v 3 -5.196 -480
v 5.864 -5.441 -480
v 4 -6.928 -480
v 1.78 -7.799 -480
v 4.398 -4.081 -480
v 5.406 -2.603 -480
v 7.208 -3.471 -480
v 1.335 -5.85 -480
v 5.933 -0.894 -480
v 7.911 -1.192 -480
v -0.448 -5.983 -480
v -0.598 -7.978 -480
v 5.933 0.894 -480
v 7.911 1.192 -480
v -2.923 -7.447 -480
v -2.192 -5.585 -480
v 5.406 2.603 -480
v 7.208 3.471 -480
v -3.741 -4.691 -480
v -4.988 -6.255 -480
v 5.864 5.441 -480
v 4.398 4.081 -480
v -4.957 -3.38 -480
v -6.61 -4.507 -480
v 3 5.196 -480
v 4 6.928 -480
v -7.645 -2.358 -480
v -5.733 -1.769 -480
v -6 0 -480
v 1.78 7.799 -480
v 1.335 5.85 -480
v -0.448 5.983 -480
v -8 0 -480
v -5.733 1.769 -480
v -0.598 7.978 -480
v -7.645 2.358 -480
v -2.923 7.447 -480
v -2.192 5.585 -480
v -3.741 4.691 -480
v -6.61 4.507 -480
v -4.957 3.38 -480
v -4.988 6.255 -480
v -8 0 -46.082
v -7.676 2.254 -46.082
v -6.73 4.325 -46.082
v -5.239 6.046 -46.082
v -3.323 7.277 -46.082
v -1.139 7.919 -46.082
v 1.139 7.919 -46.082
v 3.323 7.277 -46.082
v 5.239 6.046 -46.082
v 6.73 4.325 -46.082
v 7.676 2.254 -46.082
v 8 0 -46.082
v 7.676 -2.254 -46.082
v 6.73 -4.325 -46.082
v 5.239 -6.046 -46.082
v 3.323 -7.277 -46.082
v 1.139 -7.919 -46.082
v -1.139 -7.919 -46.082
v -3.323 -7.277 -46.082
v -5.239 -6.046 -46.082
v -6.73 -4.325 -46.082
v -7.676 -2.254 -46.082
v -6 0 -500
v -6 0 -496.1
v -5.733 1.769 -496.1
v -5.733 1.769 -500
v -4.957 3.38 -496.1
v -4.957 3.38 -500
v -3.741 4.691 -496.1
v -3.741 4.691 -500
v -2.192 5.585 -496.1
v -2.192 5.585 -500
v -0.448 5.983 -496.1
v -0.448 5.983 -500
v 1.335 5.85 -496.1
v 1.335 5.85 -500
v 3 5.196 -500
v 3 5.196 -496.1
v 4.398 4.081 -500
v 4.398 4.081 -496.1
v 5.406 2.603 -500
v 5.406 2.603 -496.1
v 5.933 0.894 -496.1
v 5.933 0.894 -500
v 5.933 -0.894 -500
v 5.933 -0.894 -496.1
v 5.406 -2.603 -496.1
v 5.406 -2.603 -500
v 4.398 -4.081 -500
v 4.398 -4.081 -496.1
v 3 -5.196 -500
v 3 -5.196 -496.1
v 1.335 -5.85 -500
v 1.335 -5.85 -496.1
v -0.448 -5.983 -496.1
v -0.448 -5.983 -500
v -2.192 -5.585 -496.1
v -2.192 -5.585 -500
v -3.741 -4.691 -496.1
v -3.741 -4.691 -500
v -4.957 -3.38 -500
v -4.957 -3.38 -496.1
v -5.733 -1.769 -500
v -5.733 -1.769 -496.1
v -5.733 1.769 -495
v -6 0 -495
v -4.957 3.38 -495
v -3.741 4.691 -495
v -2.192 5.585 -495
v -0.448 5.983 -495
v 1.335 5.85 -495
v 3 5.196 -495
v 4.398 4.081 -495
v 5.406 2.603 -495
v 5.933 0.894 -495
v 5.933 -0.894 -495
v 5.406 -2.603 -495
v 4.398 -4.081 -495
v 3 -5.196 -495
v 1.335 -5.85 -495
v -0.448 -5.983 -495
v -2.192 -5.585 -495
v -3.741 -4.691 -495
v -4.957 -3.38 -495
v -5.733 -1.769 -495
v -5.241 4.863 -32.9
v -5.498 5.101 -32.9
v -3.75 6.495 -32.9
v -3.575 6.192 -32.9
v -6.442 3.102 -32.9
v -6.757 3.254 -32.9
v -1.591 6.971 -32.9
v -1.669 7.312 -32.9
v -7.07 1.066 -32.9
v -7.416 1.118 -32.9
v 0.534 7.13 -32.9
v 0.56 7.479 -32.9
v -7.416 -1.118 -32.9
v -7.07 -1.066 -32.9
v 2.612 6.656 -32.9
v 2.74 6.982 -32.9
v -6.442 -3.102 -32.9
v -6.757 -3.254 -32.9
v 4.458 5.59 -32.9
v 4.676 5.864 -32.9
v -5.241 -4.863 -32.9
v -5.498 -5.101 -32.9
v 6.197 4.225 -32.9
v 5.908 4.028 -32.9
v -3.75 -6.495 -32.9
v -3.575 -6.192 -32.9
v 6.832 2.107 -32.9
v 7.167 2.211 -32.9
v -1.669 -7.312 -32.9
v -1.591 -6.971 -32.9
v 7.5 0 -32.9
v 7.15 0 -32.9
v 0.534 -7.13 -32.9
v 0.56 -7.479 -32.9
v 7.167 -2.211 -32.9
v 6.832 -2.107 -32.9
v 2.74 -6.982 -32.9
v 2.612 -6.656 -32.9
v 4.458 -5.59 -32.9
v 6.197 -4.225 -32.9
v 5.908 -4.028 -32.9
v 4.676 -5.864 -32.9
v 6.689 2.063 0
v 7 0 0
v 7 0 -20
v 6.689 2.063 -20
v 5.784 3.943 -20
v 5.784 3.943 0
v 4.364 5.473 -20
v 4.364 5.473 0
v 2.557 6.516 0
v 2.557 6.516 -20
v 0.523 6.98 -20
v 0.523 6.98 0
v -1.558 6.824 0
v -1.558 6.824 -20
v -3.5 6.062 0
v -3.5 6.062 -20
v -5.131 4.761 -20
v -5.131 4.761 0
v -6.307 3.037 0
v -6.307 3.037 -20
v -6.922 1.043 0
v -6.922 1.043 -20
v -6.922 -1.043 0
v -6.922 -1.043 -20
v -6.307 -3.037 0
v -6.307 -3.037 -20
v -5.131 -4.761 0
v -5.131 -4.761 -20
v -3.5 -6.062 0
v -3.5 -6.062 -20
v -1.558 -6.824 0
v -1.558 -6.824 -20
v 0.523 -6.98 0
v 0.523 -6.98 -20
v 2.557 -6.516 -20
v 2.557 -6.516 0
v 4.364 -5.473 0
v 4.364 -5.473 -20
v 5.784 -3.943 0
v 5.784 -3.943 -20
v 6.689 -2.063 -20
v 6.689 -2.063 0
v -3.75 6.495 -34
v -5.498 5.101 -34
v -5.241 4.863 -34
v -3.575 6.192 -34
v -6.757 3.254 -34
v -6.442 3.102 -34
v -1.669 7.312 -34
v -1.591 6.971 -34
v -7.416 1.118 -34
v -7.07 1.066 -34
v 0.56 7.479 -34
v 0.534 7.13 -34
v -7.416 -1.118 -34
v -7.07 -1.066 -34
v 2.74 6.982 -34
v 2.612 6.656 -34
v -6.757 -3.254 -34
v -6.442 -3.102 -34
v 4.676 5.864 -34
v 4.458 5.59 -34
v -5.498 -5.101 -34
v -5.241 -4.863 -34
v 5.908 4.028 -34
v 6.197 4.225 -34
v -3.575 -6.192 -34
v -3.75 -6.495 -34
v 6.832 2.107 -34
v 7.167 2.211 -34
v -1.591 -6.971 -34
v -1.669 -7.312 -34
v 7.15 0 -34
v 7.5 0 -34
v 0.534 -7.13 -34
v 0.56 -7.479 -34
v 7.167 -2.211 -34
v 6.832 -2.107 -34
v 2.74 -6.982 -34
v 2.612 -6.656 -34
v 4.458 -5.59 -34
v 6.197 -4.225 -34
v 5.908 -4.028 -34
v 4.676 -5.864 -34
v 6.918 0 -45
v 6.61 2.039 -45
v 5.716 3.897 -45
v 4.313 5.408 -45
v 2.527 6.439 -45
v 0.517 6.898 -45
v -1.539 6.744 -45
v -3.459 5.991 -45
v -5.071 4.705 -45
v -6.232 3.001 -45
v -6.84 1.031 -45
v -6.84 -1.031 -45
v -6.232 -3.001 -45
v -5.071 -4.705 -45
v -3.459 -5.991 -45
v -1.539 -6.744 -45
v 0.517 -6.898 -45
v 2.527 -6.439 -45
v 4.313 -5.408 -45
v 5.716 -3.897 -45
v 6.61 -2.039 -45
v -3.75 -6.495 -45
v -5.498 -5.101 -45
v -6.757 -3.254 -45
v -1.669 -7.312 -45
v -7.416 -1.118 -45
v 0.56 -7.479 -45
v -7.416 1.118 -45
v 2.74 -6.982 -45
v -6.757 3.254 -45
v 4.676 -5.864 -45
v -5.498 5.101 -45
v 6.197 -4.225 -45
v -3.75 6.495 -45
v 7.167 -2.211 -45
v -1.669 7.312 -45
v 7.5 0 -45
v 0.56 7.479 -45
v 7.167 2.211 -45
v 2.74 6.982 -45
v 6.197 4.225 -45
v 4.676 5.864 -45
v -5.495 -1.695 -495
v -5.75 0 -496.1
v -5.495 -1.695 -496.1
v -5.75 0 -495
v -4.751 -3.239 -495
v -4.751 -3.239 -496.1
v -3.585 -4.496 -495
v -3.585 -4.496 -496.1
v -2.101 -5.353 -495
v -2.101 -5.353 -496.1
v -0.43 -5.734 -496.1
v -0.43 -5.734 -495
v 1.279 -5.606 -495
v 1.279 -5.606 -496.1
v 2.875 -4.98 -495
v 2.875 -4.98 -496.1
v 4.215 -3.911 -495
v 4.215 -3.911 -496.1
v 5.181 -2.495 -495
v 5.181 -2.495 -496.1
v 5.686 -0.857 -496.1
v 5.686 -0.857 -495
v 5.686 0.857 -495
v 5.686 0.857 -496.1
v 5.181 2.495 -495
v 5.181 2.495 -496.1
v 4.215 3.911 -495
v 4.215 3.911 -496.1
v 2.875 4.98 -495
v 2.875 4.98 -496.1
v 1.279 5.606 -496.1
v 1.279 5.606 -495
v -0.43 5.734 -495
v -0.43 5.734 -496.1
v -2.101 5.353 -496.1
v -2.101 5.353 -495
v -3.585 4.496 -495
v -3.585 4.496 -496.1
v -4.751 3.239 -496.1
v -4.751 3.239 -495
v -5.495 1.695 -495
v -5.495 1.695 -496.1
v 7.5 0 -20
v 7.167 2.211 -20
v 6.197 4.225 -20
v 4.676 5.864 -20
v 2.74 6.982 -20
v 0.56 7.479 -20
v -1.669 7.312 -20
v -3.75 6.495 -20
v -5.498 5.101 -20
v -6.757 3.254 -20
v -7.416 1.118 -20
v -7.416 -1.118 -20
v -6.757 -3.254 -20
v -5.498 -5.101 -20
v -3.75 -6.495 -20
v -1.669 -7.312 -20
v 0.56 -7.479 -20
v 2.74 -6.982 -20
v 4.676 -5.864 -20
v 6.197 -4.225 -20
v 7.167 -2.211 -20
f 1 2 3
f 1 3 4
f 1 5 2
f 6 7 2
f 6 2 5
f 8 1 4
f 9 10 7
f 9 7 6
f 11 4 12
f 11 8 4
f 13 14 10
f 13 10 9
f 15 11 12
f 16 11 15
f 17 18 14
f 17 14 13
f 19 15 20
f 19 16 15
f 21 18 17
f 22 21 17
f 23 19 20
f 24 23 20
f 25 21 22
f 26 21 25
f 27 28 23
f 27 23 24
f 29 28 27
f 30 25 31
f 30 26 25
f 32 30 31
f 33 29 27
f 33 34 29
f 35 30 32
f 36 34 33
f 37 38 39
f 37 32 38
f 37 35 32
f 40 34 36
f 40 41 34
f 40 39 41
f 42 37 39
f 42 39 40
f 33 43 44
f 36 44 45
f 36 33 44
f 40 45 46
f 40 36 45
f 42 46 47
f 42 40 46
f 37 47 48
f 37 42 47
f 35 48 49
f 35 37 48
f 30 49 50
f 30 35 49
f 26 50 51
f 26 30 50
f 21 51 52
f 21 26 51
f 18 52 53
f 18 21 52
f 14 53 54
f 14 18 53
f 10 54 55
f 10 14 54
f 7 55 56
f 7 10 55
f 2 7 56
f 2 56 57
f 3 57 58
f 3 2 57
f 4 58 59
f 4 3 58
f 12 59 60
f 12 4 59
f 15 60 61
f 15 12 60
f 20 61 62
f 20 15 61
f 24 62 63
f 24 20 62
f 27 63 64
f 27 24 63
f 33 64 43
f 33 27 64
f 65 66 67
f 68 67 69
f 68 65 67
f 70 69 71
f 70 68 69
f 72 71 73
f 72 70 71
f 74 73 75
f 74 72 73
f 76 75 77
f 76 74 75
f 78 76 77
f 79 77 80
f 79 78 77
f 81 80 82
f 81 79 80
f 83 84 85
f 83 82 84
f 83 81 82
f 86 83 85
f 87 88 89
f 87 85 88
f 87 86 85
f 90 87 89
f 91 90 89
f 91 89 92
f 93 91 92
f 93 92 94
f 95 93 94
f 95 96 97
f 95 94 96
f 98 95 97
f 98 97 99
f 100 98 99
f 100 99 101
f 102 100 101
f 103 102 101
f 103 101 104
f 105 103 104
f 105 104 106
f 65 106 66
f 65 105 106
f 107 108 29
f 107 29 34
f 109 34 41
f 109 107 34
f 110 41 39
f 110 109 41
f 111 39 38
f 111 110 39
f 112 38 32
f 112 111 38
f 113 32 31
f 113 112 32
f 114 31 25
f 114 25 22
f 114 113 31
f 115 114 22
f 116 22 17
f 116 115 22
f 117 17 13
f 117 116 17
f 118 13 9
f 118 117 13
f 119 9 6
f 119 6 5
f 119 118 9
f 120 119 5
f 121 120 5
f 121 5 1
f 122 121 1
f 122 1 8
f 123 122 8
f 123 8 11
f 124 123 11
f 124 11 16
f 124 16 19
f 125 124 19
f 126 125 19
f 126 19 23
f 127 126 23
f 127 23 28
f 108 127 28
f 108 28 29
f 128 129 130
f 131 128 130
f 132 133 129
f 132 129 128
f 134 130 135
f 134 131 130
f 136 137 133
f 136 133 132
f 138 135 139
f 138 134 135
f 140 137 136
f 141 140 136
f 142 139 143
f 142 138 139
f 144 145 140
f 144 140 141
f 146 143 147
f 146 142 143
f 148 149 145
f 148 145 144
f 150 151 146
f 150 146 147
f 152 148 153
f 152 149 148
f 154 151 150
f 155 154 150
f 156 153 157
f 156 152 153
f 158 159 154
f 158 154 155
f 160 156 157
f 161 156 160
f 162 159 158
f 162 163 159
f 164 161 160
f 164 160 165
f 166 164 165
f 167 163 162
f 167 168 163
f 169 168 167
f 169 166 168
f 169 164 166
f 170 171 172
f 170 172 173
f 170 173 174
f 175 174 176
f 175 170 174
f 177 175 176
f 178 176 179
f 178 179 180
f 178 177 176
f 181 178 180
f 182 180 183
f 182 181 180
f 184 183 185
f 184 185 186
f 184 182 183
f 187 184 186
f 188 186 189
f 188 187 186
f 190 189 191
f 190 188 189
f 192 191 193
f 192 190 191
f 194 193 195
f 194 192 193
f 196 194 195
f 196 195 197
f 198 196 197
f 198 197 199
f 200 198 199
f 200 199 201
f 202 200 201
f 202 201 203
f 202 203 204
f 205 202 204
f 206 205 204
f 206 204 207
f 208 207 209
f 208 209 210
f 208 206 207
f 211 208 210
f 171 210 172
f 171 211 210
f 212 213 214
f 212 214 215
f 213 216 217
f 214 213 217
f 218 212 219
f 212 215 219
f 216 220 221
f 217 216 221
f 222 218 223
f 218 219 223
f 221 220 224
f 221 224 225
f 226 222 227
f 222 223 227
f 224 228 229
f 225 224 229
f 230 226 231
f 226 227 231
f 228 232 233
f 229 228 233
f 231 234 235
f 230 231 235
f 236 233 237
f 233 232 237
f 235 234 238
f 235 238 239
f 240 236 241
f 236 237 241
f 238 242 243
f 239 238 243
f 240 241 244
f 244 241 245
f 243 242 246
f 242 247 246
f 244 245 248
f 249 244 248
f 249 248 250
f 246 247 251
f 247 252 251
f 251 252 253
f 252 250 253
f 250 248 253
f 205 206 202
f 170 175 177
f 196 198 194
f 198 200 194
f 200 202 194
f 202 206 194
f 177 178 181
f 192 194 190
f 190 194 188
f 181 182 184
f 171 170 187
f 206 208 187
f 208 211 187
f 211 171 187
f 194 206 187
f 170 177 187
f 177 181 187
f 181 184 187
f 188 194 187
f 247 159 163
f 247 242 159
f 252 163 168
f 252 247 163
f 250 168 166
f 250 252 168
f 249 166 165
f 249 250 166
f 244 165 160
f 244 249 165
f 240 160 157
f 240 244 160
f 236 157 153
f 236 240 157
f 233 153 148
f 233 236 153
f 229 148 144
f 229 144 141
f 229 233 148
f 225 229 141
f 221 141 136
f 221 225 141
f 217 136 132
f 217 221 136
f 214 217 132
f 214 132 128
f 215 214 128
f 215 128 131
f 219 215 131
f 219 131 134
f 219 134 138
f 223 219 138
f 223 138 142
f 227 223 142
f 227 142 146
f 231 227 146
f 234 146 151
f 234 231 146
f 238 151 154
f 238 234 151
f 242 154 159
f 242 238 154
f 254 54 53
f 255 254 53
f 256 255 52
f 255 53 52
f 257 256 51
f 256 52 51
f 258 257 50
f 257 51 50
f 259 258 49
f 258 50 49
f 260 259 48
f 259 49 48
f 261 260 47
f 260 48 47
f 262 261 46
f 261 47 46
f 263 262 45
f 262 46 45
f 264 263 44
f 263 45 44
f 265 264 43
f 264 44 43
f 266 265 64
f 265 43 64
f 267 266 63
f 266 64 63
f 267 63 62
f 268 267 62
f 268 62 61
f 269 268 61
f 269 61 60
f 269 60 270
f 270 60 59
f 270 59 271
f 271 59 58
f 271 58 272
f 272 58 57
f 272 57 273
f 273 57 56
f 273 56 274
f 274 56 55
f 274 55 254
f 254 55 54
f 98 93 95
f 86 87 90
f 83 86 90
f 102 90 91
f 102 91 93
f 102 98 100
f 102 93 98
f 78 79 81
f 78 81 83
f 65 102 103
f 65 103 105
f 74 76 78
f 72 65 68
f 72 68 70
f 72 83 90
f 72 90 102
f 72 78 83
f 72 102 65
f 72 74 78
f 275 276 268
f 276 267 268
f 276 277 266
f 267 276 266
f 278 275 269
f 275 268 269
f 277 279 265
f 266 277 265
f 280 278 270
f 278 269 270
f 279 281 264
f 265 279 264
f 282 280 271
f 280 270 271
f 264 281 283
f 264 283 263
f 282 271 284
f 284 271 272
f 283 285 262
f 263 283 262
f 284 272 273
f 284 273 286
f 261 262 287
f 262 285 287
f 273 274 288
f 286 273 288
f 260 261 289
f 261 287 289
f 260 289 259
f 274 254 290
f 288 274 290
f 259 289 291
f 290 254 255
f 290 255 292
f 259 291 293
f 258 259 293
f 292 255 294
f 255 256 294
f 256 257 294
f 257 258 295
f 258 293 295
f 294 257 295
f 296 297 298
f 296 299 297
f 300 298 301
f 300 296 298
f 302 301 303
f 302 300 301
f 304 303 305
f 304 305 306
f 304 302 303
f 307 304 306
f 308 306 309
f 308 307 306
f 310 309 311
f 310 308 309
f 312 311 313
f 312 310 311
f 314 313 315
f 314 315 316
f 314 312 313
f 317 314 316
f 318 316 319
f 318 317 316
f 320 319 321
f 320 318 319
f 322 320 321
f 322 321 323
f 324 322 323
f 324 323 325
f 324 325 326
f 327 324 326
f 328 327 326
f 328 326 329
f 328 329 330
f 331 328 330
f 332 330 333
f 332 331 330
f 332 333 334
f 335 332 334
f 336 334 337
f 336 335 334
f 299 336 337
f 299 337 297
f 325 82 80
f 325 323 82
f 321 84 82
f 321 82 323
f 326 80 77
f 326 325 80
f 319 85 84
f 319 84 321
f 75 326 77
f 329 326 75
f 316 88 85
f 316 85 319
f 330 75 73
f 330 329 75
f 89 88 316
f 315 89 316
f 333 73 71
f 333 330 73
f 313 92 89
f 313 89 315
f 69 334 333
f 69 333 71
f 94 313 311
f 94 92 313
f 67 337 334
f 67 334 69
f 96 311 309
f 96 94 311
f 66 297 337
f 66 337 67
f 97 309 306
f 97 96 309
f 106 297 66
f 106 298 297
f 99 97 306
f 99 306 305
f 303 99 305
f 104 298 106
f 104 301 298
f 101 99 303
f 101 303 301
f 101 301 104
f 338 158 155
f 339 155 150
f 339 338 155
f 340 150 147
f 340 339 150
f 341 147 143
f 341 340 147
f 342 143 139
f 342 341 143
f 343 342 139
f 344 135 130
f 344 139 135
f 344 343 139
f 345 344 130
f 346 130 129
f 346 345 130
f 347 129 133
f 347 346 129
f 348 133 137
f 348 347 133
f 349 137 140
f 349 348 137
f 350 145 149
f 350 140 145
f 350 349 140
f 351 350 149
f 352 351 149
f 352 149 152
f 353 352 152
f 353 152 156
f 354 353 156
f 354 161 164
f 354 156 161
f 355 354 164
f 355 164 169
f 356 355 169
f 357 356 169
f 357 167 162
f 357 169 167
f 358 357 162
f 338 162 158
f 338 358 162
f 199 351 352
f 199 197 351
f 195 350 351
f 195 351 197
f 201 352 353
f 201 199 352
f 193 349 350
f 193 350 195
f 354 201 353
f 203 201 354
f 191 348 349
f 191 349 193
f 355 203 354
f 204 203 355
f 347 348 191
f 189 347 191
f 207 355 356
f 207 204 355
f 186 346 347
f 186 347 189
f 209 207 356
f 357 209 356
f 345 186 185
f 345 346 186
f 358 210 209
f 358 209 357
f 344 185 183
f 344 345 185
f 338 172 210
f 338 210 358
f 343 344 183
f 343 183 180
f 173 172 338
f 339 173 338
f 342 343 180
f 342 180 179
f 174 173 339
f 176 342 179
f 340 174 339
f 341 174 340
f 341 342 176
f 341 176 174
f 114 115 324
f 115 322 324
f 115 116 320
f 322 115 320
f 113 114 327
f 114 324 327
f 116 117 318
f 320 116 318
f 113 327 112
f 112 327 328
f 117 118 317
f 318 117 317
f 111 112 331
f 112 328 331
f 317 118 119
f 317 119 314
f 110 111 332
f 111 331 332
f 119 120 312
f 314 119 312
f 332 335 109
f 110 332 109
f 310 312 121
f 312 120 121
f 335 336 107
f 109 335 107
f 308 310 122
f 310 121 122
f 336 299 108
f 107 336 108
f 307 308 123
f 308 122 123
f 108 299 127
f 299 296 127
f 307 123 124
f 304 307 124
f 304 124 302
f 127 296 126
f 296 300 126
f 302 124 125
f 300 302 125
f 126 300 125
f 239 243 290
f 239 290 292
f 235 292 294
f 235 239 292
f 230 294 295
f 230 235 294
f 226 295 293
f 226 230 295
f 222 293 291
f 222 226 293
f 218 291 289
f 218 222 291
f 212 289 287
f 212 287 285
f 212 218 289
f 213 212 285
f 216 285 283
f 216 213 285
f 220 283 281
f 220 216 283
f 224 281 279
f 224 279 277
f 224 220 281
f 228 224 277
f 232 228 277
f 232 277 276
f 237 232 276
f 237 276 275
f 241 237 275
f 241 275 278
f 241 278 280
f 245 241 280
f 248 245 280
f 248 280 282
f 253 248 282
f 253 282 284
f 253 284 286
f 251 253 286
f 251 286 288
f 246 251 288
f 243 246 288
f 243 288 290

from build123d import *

# Parameters (mm, degrees)
SWEEP_1_PROFILE_R   = 8
SKETCH_11_OUTSIDE_W = 118.102
SKETCH_11_OUTSIDE_H = 118.102
SKETCH_11_OUTSIDE_R = 7
CUT_EXTRUDE_1_DEPTH = 20
SKETCH_16_OUTSIDE_W = 118.102
SKETCH_16_OUTSIDE_H = 118.102
SKETCH_16_OUTSIDE_R = 7.5
CUT_EXTRUDE_3_DEPTH = 25
SKETCH_31_W         = 1.1
SKETCH_31_H         = 0.35
SKETCH_12_OUTSIDE_W = 118.102
SKETCH_12_OUTSIDE_H = 118.102
SKETCH_12_OUTSIDE_R = 6
CUT_EXTRUDE_2_DEPTH = 20
SKETCH_3_W          = 1.1
SKETCH_3_H          = 0.25


# Read off the part's stored shape, not the designer's step: M16 机械螺纹 螺柱1
with BuildPart() as part:
    # 扫描1: sweep along a path in 草图1
    with BuildLine(Plane(origin=(0, 0, 0), x_dir=(0, 0, -1), z_dir=(1, 0, 0))) as sweep_1_path:
        Line((0, 0), (500, 0))
    # 扫描1 profile (on start of the path) → 扫描1 (sweep)
    with BuildSketch(Plane(origin=(0, 0, 0), x_dir=(-1, 0, 0), z_dir=(0, 0, -1))):
        Circle(SWEEP_1_PROFILE_R)
    sweep(path=sweep_1_path.line)

    # 草图11 outside → 切除-拉伸1 (cut)
    with BuildSketch(Plane.XY):
        Rectangle(SKETCH_11_OUTSIDE_W, SKETCH_11_OUTSIDE_H)
        Circle(SKETCH_11_OUTSIDE_R, mode=Mode.SUBTRACT)
    extrude(amount=-CUT_EXTRUDE_1_DEPTH, mode=Mode.SUBTRACT)

    # 草图16 outside → 切除-拉伸3 (cut)
    with BuildSketch(Plane.XY.offset(-20)):
        Rectangle(SKETCH_16_OUTSIDE_W, SKETCH_16_OUTSIDE_H)
        Circle(SKETCH_16_OUTSIDE_R, mode=Mode.SUBTRACT)
    extrude(amount=-CUT_EXTRUDE_3_DEPTH, mode=Mode.SUBTRACT)

    # 草图31 → 切除-旋转11 (revolve, cut)
    with BuildSketch(Plane(origin=(100, 0, -20), x_dir=(0, 0, -1), z_dir=(0, 1, 0))):
        with Locations((13.45, 92.675)):
            Rectangle(SKETCH_31_W, SKETCH_31_H)
    revolve(axis=Axis((0, 0, -20), (0, 0, -1)), mode=Mode.SUBTRACT)

    # 草图12 outside → 切除-拉伸2 (cut)
    with BuildSketch(Plane(origin=(0, 0, -500), x_dir=(-1, 0, 0), z_dir=(0, 0, -1))):
        Rectangle(SKETCH_12_OUTSIDE_W, SKETCH_12_OUTSIDE_H)
        Circle(SKETCH_12_OUTSIDE_R, mode=Mode.SUBTRACT)
    extrude(amount=-CUT_EXTRUDE_2_DEPTH, mode=Mode.SUBTRACT)

    # M16 机械螺纹 螺柱1 outline → M16 机械螺纹 螺柱1 (revolve, cut)
    with BuildSketch(Plane.XZ):
        Polygon((8, -45), (6.9175, -45), (8, -46.0825), align=None)
    revolve(axis=Axis((0, 0, 0), (0, 0, 1)), mode=Mode.SUBTRACT)

    # 草图3 → 切除-旋转1 (revolve, cut)
    with BuildSketch(Plane(origin=(-100, 0, -500), x_dir=(0, 0, 1), z_dir=(0, 1, 0))):
        with Locations((4.45, 94.125)):
            Rectangle(SKETCH_3_W, SKETCH_3_H)
    revolve(axis=Axis((0, 0, -500), (0, 0, 1)), mode=Mode.SUBTRACT)


solid = part.part
